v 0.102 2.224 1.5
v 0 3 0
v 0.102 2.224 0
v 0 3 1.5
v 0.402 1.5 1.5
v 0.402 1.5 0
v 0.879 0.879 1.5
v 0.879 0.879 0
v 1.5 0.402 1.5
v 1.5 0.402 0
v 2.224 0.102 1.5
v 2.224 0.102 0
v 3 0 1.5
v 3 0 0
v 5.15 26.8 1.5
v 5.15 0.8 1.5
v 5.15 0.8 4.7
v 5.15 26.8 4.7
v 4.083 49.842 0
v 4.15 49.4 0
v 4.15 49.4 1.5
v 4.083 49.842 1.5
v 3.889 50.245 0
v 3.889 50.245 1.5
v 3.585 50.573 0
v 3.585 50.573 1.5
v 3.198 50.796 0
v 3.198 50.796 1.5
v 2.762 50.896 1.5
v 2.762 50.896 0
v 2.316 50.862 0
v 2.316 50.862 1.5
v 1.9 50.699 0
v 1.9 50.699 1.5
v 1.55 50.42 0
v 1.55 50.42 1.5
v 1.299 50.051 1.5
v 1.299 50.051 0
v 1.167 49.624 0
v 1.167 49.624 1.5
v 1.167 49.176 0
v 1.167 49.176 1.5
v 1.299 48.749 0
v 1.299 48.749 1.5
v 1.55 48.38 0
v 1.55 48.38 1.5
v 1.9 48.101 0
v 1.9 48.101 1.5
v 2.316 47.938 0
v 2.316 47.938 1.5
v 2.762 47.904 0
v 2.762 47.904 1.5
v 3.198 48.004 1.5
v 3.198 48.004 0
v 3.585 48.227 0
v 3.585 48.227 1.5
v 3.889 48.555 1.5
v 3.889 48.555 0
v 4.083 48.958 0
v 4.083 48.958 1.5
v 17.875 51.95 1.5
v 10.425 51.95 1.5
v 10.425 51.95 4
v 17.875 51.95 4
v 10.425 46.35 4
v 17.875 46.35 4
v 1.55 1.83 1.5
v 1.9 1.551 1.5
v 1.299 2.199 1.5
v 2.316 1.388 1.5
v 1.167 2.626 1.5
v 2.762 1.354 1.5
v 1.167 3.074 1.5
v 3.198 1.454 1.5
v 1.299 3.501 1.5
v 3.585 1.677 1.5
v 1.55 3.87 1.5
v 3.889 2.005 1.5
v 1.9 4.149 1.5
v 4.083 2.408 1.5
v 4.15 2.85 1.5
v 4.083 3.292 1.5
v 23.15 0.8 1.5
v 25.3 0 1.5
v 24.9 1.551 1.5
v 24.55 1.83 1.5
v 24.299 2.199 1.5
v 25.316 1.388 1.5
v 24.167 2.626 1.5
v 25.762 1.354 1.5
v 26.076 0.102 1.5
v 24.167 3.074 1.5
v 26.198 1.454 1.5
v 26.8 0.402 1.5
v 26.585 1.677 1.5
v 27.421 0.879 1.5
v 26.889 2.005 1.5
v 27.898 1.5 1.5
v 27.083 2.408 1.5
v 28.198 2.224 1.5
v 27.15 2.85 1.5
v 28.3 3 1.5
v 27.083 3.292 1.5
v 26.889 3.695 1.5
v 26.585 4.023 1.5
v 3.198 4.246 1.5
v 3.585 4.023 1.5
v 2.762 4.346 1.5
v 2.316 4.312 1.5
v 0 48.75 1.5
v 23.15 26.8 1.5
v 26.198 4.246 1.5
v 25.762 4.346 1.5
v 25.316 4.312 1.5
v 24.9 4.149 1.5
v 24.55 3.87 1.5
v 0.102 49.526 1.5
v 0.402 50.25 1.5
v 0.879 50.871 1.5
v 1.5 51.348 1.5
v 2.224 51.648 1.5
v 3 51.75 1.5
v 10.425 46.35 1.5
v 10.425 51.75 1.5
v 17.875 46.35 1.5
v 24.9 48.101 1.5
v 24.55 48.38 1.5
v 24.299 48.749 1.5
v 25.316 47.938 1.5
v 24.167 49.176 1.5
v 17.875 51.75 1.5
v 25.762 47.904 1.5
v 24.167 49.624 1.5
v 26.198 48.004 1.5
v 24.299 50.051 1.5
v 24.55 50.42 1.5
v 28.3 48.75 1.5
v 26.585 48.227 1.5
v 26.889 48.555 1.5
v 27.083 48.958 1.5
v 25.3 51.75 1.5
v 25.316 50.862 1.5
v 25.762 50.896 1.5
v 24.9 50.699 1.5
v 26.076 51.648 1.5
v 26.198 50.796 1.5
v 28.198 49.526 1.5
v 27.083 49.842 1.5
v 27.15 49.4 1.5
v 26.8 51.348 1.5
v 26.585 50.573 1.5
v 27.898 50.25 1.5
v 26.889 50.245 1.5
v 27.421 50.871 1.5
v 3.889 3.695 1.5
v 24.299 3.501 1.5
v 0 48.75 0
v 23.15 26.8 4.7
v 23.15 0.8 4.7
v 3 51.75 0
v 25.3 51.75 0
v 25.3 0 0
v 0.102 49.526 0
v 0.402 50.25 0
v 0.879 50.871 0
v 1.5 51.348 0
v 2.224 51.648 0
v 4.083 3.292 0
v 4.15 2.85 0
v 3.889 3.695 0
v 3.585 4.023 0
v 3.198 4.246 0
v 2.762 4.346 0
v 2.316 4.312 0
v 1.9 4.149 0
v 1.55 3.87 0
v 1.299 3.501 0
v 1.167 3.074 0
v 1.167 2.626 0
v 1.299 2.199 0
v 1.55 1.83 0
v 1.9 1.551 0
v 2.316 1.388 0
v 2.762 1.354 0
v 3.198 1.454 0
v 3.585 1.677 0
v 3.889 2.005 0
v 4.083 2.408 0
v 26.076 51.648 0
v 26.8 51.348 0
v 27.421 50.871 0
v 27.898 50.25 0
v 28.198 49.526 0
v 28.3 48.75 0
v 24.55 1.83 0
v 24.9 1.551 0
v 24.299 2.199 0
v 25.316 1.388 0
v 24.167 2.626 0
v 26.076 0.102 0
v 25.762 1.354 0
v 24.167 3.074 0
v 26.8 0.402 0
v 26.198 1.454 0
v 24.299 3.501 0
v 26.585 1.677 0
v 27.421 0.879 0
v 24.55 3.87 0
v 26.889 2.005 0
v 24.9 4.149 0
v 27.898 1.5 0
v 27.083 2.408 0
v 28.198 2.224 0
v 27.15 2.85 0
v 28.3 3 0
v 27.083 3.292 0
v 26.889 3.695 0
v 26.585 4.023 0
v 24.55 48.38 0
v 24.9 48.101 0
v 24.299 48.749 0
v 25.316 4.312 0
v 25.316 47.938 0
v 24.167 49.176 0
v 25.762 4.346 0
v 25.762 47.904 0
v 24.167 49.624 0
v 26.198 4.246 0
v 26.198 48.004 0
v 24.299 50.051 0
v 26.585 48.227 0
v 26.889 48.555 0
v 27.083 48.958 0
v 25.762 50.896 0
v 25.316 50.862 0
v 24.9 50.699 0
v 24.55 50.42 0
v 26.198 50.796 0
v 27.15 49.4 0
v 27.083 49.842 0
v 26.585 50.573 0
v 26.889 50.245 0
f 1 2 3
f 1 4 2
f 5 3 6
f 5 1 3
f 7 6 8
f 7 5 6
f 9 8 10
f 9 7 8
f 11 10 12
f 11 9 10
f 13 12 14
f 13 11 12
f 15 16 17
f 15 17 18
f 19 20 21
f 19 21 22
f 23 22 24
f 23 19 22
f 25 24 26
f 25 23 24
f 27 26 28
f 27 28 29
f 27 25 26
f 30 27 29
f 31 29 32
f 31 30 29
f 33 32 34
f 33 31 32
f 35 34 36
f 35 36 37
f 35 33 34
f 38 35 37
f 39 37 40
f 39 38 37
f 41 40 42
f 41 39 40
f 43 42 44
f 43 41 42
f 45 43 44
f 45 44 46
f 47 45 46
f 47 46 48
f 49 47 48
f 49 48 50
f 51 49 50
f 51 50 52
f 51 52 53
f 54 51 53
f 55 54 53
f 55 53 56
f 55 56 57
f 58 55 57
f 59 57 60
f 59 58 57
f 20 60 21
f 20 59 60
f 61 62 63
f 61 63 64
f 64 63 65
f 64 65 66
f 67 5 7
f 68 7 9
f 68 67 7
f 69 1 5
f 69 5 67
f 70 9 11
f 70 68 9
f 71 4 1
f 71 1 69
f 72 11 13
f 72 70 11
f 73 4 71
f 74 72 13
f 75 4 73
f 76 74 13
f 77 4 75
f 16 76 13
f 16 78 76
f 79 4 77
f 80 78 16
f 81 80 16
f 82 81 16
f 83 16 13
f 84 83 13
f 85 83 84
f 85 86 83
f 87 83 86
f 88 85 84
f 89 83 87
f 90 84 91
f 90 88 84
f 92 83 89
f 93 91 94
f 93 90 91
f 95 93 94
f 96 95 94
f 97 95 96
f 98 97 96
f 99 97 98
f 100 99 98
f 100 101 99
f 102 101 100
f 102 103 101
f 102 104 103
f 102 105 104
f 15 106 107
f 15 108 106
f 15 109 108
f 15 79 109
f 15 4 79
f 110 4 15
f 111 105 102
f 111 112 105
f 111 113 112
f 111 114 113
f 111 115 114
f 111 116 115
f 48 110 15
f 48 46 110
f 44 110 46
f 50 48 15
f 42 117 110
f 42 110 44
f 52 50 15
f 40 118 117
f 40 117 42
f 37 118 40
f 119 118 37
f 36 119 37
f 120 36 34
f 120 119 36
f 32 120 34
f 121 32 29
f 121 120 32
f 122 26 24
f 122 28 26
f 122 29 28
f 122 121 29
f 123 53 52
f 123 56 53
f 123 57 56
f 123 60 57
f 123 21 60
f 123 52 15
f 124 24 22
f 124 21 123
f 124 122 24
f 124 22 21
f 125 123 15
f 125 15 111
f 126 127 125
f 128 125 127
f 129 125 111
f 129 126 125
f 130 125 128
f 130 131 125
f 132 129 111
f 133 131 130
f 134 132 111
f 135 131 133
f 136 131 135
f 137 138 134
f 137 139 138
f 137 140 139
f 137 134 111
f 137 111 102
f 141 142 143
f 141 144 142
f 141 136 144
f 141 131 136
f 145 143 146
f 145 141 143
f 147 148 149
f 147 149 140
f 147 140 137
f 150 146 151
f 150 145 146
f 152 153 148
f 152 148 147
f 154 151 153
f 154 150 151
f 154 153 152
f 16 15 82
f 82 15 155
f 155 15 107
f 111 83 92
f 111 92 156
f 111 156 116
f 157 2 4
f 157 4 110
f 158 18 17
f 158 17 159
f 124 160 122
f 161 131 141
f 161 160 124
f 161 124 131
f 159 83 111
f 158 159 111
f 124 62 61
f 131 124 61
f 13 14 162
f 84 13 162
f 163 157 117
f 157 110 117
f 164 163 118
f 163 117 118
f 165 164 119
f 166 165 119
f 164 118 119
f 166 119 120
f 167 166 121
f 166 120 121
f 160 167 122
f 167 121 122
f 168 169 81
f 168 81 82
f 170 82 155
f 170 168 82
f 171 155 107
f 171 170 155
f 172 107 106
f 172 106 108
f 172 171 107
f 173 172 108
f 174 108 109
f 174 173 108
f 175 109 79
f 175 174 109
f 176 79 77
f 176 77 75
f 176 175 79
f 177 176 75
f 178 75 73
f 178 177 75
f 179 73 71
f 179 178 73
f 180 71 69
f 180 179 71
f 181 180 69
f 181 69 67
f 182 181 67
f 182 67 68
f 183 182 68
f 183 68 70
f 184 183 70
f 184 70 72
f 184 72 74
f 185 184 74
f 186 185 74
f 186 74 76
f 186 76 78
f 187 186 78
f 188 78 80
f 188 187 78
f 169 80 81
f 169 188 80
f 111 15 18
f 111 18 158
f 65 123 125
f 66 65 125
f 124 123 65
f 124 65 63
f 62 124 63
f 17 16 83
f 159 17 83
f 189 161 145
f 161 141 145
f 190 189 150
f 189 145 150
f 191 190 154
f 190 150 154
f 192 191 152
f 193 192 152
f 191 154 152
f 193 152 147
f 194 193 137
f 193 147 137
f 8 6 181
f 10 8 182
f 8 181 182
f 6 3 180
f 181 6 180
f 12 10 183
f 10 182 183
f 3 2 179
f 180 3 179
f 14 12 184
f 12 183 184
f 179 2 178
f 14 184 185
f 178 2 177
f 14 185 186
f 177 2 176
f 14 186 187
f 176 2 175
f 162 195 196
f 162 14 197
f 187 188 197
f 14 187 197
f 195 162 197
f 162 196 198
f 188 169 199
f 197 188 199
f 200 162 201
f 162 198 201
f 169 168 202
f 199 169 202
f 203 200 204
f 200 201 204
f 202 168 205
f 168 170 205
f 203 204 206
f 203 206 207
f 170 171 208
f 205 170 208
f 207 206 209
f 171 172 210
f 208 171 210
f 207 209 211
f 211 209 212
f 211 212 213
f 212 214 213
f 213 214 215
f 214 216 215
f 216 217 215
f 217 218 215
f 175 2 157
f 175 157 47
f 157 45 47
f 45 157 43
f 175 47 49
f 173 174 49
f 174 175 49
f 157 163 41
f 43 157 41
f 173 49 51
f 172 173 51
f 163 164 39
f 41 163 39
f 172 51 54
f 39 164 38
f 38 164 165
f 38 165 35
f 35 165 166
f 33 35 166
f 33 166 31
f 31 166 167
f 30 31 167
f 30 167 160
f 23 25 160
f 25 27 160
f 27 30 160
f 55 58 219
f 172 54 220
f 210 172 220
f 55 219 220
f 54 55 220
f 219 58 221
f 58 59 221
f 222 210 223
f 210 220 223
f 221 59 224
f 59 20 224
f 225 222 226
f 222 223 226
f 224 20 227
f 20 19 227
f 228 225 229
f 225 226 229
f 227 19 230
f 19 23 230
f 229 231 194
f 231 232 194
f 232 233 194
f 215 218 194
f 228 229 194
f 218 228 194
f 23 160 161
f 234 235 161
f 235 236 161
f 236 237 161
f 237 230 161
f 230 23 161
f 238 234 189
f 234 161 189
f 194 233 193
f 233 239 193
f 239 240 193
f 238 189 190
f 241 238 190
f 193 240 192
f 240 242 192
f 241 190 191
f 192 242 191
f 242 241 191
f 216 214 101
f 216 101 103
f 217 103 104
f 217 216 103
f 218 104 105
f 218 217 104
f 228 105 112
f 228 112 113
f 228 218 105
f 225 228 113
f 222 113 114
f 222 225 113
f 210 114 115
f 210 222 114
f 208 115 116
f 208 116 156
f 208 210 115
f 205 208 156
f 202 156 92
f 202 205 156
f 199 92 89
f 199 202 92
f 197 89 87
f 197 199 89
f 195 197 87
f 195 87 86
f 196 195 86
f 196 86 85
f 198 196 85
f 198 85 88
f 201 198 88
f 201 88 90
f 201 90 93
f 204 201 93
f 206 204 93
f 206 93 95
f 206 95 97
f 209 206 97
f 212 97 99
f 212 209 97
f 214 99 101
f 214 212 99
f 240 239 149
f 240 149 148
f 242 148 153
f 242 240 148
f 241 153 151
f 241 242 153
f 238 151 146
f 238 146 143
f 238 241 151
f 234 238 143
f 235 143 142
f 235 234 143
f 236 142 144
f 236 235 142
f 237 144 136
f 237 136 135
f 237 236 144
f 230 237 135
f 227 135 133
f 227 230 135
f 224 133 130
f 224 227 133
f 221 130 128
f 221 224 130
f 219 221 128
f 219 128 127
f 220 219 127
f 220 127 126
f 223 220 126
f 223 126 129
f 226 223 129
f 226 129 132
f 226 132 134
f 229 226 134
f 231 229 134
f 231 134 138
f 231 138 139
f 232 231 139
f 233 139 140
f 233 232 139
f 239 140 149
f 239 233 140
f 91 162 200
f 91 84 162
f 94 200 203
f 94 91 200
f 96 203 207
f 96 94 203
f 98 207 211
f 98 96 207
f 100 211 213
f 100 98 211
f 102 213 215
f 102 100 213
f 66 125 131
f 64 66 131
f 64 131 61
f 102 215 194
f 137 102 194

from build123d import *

# Parameters (mm, degrees)
SKETCH1_W           = 28.3
SKETCH1_H           = 51.75
SKETCH1_R           = 1.5
BOSS_EXTRUDE1_DEPTH = 1.5
FILLET1_R           = 3
SKETCH2_W           = 18
SKETCH2_H           = 26
BOSS_EXTRUDE2_DEPTH = 3.2
SKETCH3_W           = 7.45
SKETCH3_H           = 5.6
BOSS_EXTRUDE3_DEPTH = 2.5


with BuildPart() as part:
    # Sketch1 → Boss-Extrude1 (new body)
    with BuildSketch(Plane.XY):
        with Locations((14.15, 25.875)):
            Rectangle(SKETCH1_W, SKETCH1_H)
        with Locations((2.65, 49.4)):
            Circle(SKETCH1_R, mode=Mode.SUBTRACT)
        with Locations((25.65, 49.4)):
            Circle(SKETCH1_R, mode=Mode.SUBTRACT)
        with Locations((2.65, 2.85)):
            Circle(SKETCH1_R, mode=Mode.SUBTRACT)
        with Locations((25.65, 2.85)):
            Circle(SKETCH1_R, mode=Mode.SUBTRACT)
    extrude(amount=BOSS_EXTRUDE1_DEPTH)

    # Fillet1
    fillet1_edges = [part.edges().sort_by_distance(p)[0] for p in [
        (0, 51.75, 0.75),
        (28.3, 51.75, 0.75),
        (28.3, 0, 0.75),
        (0, 0, 0.75),
    ]]
    fillet(fillet1_edges, radius=FILLET1_R)

    # Sketch2 → Boss-Extrude2 (add)
    with BuildSketch(Plane.XY.offset(1.5)):
        with Locations((14.15, 13.8)):
            Rectangle(SKETCH2_W, SKETCH2_H)
    extrude(amount=BOSS_EXTRUDE2_DEPTH)

    # Sketch3 → Boss-Extrude3 (add)
    with BuildSketch(Plane.XY.offset(1.5)):
        with Locations((14.15, 49.15)):
            Rectangle(SKETCH3_W, SKETCH3_H)
    extrude(amount=BOSS_EXTRUDE3_DEPTH)


solid = part.part
